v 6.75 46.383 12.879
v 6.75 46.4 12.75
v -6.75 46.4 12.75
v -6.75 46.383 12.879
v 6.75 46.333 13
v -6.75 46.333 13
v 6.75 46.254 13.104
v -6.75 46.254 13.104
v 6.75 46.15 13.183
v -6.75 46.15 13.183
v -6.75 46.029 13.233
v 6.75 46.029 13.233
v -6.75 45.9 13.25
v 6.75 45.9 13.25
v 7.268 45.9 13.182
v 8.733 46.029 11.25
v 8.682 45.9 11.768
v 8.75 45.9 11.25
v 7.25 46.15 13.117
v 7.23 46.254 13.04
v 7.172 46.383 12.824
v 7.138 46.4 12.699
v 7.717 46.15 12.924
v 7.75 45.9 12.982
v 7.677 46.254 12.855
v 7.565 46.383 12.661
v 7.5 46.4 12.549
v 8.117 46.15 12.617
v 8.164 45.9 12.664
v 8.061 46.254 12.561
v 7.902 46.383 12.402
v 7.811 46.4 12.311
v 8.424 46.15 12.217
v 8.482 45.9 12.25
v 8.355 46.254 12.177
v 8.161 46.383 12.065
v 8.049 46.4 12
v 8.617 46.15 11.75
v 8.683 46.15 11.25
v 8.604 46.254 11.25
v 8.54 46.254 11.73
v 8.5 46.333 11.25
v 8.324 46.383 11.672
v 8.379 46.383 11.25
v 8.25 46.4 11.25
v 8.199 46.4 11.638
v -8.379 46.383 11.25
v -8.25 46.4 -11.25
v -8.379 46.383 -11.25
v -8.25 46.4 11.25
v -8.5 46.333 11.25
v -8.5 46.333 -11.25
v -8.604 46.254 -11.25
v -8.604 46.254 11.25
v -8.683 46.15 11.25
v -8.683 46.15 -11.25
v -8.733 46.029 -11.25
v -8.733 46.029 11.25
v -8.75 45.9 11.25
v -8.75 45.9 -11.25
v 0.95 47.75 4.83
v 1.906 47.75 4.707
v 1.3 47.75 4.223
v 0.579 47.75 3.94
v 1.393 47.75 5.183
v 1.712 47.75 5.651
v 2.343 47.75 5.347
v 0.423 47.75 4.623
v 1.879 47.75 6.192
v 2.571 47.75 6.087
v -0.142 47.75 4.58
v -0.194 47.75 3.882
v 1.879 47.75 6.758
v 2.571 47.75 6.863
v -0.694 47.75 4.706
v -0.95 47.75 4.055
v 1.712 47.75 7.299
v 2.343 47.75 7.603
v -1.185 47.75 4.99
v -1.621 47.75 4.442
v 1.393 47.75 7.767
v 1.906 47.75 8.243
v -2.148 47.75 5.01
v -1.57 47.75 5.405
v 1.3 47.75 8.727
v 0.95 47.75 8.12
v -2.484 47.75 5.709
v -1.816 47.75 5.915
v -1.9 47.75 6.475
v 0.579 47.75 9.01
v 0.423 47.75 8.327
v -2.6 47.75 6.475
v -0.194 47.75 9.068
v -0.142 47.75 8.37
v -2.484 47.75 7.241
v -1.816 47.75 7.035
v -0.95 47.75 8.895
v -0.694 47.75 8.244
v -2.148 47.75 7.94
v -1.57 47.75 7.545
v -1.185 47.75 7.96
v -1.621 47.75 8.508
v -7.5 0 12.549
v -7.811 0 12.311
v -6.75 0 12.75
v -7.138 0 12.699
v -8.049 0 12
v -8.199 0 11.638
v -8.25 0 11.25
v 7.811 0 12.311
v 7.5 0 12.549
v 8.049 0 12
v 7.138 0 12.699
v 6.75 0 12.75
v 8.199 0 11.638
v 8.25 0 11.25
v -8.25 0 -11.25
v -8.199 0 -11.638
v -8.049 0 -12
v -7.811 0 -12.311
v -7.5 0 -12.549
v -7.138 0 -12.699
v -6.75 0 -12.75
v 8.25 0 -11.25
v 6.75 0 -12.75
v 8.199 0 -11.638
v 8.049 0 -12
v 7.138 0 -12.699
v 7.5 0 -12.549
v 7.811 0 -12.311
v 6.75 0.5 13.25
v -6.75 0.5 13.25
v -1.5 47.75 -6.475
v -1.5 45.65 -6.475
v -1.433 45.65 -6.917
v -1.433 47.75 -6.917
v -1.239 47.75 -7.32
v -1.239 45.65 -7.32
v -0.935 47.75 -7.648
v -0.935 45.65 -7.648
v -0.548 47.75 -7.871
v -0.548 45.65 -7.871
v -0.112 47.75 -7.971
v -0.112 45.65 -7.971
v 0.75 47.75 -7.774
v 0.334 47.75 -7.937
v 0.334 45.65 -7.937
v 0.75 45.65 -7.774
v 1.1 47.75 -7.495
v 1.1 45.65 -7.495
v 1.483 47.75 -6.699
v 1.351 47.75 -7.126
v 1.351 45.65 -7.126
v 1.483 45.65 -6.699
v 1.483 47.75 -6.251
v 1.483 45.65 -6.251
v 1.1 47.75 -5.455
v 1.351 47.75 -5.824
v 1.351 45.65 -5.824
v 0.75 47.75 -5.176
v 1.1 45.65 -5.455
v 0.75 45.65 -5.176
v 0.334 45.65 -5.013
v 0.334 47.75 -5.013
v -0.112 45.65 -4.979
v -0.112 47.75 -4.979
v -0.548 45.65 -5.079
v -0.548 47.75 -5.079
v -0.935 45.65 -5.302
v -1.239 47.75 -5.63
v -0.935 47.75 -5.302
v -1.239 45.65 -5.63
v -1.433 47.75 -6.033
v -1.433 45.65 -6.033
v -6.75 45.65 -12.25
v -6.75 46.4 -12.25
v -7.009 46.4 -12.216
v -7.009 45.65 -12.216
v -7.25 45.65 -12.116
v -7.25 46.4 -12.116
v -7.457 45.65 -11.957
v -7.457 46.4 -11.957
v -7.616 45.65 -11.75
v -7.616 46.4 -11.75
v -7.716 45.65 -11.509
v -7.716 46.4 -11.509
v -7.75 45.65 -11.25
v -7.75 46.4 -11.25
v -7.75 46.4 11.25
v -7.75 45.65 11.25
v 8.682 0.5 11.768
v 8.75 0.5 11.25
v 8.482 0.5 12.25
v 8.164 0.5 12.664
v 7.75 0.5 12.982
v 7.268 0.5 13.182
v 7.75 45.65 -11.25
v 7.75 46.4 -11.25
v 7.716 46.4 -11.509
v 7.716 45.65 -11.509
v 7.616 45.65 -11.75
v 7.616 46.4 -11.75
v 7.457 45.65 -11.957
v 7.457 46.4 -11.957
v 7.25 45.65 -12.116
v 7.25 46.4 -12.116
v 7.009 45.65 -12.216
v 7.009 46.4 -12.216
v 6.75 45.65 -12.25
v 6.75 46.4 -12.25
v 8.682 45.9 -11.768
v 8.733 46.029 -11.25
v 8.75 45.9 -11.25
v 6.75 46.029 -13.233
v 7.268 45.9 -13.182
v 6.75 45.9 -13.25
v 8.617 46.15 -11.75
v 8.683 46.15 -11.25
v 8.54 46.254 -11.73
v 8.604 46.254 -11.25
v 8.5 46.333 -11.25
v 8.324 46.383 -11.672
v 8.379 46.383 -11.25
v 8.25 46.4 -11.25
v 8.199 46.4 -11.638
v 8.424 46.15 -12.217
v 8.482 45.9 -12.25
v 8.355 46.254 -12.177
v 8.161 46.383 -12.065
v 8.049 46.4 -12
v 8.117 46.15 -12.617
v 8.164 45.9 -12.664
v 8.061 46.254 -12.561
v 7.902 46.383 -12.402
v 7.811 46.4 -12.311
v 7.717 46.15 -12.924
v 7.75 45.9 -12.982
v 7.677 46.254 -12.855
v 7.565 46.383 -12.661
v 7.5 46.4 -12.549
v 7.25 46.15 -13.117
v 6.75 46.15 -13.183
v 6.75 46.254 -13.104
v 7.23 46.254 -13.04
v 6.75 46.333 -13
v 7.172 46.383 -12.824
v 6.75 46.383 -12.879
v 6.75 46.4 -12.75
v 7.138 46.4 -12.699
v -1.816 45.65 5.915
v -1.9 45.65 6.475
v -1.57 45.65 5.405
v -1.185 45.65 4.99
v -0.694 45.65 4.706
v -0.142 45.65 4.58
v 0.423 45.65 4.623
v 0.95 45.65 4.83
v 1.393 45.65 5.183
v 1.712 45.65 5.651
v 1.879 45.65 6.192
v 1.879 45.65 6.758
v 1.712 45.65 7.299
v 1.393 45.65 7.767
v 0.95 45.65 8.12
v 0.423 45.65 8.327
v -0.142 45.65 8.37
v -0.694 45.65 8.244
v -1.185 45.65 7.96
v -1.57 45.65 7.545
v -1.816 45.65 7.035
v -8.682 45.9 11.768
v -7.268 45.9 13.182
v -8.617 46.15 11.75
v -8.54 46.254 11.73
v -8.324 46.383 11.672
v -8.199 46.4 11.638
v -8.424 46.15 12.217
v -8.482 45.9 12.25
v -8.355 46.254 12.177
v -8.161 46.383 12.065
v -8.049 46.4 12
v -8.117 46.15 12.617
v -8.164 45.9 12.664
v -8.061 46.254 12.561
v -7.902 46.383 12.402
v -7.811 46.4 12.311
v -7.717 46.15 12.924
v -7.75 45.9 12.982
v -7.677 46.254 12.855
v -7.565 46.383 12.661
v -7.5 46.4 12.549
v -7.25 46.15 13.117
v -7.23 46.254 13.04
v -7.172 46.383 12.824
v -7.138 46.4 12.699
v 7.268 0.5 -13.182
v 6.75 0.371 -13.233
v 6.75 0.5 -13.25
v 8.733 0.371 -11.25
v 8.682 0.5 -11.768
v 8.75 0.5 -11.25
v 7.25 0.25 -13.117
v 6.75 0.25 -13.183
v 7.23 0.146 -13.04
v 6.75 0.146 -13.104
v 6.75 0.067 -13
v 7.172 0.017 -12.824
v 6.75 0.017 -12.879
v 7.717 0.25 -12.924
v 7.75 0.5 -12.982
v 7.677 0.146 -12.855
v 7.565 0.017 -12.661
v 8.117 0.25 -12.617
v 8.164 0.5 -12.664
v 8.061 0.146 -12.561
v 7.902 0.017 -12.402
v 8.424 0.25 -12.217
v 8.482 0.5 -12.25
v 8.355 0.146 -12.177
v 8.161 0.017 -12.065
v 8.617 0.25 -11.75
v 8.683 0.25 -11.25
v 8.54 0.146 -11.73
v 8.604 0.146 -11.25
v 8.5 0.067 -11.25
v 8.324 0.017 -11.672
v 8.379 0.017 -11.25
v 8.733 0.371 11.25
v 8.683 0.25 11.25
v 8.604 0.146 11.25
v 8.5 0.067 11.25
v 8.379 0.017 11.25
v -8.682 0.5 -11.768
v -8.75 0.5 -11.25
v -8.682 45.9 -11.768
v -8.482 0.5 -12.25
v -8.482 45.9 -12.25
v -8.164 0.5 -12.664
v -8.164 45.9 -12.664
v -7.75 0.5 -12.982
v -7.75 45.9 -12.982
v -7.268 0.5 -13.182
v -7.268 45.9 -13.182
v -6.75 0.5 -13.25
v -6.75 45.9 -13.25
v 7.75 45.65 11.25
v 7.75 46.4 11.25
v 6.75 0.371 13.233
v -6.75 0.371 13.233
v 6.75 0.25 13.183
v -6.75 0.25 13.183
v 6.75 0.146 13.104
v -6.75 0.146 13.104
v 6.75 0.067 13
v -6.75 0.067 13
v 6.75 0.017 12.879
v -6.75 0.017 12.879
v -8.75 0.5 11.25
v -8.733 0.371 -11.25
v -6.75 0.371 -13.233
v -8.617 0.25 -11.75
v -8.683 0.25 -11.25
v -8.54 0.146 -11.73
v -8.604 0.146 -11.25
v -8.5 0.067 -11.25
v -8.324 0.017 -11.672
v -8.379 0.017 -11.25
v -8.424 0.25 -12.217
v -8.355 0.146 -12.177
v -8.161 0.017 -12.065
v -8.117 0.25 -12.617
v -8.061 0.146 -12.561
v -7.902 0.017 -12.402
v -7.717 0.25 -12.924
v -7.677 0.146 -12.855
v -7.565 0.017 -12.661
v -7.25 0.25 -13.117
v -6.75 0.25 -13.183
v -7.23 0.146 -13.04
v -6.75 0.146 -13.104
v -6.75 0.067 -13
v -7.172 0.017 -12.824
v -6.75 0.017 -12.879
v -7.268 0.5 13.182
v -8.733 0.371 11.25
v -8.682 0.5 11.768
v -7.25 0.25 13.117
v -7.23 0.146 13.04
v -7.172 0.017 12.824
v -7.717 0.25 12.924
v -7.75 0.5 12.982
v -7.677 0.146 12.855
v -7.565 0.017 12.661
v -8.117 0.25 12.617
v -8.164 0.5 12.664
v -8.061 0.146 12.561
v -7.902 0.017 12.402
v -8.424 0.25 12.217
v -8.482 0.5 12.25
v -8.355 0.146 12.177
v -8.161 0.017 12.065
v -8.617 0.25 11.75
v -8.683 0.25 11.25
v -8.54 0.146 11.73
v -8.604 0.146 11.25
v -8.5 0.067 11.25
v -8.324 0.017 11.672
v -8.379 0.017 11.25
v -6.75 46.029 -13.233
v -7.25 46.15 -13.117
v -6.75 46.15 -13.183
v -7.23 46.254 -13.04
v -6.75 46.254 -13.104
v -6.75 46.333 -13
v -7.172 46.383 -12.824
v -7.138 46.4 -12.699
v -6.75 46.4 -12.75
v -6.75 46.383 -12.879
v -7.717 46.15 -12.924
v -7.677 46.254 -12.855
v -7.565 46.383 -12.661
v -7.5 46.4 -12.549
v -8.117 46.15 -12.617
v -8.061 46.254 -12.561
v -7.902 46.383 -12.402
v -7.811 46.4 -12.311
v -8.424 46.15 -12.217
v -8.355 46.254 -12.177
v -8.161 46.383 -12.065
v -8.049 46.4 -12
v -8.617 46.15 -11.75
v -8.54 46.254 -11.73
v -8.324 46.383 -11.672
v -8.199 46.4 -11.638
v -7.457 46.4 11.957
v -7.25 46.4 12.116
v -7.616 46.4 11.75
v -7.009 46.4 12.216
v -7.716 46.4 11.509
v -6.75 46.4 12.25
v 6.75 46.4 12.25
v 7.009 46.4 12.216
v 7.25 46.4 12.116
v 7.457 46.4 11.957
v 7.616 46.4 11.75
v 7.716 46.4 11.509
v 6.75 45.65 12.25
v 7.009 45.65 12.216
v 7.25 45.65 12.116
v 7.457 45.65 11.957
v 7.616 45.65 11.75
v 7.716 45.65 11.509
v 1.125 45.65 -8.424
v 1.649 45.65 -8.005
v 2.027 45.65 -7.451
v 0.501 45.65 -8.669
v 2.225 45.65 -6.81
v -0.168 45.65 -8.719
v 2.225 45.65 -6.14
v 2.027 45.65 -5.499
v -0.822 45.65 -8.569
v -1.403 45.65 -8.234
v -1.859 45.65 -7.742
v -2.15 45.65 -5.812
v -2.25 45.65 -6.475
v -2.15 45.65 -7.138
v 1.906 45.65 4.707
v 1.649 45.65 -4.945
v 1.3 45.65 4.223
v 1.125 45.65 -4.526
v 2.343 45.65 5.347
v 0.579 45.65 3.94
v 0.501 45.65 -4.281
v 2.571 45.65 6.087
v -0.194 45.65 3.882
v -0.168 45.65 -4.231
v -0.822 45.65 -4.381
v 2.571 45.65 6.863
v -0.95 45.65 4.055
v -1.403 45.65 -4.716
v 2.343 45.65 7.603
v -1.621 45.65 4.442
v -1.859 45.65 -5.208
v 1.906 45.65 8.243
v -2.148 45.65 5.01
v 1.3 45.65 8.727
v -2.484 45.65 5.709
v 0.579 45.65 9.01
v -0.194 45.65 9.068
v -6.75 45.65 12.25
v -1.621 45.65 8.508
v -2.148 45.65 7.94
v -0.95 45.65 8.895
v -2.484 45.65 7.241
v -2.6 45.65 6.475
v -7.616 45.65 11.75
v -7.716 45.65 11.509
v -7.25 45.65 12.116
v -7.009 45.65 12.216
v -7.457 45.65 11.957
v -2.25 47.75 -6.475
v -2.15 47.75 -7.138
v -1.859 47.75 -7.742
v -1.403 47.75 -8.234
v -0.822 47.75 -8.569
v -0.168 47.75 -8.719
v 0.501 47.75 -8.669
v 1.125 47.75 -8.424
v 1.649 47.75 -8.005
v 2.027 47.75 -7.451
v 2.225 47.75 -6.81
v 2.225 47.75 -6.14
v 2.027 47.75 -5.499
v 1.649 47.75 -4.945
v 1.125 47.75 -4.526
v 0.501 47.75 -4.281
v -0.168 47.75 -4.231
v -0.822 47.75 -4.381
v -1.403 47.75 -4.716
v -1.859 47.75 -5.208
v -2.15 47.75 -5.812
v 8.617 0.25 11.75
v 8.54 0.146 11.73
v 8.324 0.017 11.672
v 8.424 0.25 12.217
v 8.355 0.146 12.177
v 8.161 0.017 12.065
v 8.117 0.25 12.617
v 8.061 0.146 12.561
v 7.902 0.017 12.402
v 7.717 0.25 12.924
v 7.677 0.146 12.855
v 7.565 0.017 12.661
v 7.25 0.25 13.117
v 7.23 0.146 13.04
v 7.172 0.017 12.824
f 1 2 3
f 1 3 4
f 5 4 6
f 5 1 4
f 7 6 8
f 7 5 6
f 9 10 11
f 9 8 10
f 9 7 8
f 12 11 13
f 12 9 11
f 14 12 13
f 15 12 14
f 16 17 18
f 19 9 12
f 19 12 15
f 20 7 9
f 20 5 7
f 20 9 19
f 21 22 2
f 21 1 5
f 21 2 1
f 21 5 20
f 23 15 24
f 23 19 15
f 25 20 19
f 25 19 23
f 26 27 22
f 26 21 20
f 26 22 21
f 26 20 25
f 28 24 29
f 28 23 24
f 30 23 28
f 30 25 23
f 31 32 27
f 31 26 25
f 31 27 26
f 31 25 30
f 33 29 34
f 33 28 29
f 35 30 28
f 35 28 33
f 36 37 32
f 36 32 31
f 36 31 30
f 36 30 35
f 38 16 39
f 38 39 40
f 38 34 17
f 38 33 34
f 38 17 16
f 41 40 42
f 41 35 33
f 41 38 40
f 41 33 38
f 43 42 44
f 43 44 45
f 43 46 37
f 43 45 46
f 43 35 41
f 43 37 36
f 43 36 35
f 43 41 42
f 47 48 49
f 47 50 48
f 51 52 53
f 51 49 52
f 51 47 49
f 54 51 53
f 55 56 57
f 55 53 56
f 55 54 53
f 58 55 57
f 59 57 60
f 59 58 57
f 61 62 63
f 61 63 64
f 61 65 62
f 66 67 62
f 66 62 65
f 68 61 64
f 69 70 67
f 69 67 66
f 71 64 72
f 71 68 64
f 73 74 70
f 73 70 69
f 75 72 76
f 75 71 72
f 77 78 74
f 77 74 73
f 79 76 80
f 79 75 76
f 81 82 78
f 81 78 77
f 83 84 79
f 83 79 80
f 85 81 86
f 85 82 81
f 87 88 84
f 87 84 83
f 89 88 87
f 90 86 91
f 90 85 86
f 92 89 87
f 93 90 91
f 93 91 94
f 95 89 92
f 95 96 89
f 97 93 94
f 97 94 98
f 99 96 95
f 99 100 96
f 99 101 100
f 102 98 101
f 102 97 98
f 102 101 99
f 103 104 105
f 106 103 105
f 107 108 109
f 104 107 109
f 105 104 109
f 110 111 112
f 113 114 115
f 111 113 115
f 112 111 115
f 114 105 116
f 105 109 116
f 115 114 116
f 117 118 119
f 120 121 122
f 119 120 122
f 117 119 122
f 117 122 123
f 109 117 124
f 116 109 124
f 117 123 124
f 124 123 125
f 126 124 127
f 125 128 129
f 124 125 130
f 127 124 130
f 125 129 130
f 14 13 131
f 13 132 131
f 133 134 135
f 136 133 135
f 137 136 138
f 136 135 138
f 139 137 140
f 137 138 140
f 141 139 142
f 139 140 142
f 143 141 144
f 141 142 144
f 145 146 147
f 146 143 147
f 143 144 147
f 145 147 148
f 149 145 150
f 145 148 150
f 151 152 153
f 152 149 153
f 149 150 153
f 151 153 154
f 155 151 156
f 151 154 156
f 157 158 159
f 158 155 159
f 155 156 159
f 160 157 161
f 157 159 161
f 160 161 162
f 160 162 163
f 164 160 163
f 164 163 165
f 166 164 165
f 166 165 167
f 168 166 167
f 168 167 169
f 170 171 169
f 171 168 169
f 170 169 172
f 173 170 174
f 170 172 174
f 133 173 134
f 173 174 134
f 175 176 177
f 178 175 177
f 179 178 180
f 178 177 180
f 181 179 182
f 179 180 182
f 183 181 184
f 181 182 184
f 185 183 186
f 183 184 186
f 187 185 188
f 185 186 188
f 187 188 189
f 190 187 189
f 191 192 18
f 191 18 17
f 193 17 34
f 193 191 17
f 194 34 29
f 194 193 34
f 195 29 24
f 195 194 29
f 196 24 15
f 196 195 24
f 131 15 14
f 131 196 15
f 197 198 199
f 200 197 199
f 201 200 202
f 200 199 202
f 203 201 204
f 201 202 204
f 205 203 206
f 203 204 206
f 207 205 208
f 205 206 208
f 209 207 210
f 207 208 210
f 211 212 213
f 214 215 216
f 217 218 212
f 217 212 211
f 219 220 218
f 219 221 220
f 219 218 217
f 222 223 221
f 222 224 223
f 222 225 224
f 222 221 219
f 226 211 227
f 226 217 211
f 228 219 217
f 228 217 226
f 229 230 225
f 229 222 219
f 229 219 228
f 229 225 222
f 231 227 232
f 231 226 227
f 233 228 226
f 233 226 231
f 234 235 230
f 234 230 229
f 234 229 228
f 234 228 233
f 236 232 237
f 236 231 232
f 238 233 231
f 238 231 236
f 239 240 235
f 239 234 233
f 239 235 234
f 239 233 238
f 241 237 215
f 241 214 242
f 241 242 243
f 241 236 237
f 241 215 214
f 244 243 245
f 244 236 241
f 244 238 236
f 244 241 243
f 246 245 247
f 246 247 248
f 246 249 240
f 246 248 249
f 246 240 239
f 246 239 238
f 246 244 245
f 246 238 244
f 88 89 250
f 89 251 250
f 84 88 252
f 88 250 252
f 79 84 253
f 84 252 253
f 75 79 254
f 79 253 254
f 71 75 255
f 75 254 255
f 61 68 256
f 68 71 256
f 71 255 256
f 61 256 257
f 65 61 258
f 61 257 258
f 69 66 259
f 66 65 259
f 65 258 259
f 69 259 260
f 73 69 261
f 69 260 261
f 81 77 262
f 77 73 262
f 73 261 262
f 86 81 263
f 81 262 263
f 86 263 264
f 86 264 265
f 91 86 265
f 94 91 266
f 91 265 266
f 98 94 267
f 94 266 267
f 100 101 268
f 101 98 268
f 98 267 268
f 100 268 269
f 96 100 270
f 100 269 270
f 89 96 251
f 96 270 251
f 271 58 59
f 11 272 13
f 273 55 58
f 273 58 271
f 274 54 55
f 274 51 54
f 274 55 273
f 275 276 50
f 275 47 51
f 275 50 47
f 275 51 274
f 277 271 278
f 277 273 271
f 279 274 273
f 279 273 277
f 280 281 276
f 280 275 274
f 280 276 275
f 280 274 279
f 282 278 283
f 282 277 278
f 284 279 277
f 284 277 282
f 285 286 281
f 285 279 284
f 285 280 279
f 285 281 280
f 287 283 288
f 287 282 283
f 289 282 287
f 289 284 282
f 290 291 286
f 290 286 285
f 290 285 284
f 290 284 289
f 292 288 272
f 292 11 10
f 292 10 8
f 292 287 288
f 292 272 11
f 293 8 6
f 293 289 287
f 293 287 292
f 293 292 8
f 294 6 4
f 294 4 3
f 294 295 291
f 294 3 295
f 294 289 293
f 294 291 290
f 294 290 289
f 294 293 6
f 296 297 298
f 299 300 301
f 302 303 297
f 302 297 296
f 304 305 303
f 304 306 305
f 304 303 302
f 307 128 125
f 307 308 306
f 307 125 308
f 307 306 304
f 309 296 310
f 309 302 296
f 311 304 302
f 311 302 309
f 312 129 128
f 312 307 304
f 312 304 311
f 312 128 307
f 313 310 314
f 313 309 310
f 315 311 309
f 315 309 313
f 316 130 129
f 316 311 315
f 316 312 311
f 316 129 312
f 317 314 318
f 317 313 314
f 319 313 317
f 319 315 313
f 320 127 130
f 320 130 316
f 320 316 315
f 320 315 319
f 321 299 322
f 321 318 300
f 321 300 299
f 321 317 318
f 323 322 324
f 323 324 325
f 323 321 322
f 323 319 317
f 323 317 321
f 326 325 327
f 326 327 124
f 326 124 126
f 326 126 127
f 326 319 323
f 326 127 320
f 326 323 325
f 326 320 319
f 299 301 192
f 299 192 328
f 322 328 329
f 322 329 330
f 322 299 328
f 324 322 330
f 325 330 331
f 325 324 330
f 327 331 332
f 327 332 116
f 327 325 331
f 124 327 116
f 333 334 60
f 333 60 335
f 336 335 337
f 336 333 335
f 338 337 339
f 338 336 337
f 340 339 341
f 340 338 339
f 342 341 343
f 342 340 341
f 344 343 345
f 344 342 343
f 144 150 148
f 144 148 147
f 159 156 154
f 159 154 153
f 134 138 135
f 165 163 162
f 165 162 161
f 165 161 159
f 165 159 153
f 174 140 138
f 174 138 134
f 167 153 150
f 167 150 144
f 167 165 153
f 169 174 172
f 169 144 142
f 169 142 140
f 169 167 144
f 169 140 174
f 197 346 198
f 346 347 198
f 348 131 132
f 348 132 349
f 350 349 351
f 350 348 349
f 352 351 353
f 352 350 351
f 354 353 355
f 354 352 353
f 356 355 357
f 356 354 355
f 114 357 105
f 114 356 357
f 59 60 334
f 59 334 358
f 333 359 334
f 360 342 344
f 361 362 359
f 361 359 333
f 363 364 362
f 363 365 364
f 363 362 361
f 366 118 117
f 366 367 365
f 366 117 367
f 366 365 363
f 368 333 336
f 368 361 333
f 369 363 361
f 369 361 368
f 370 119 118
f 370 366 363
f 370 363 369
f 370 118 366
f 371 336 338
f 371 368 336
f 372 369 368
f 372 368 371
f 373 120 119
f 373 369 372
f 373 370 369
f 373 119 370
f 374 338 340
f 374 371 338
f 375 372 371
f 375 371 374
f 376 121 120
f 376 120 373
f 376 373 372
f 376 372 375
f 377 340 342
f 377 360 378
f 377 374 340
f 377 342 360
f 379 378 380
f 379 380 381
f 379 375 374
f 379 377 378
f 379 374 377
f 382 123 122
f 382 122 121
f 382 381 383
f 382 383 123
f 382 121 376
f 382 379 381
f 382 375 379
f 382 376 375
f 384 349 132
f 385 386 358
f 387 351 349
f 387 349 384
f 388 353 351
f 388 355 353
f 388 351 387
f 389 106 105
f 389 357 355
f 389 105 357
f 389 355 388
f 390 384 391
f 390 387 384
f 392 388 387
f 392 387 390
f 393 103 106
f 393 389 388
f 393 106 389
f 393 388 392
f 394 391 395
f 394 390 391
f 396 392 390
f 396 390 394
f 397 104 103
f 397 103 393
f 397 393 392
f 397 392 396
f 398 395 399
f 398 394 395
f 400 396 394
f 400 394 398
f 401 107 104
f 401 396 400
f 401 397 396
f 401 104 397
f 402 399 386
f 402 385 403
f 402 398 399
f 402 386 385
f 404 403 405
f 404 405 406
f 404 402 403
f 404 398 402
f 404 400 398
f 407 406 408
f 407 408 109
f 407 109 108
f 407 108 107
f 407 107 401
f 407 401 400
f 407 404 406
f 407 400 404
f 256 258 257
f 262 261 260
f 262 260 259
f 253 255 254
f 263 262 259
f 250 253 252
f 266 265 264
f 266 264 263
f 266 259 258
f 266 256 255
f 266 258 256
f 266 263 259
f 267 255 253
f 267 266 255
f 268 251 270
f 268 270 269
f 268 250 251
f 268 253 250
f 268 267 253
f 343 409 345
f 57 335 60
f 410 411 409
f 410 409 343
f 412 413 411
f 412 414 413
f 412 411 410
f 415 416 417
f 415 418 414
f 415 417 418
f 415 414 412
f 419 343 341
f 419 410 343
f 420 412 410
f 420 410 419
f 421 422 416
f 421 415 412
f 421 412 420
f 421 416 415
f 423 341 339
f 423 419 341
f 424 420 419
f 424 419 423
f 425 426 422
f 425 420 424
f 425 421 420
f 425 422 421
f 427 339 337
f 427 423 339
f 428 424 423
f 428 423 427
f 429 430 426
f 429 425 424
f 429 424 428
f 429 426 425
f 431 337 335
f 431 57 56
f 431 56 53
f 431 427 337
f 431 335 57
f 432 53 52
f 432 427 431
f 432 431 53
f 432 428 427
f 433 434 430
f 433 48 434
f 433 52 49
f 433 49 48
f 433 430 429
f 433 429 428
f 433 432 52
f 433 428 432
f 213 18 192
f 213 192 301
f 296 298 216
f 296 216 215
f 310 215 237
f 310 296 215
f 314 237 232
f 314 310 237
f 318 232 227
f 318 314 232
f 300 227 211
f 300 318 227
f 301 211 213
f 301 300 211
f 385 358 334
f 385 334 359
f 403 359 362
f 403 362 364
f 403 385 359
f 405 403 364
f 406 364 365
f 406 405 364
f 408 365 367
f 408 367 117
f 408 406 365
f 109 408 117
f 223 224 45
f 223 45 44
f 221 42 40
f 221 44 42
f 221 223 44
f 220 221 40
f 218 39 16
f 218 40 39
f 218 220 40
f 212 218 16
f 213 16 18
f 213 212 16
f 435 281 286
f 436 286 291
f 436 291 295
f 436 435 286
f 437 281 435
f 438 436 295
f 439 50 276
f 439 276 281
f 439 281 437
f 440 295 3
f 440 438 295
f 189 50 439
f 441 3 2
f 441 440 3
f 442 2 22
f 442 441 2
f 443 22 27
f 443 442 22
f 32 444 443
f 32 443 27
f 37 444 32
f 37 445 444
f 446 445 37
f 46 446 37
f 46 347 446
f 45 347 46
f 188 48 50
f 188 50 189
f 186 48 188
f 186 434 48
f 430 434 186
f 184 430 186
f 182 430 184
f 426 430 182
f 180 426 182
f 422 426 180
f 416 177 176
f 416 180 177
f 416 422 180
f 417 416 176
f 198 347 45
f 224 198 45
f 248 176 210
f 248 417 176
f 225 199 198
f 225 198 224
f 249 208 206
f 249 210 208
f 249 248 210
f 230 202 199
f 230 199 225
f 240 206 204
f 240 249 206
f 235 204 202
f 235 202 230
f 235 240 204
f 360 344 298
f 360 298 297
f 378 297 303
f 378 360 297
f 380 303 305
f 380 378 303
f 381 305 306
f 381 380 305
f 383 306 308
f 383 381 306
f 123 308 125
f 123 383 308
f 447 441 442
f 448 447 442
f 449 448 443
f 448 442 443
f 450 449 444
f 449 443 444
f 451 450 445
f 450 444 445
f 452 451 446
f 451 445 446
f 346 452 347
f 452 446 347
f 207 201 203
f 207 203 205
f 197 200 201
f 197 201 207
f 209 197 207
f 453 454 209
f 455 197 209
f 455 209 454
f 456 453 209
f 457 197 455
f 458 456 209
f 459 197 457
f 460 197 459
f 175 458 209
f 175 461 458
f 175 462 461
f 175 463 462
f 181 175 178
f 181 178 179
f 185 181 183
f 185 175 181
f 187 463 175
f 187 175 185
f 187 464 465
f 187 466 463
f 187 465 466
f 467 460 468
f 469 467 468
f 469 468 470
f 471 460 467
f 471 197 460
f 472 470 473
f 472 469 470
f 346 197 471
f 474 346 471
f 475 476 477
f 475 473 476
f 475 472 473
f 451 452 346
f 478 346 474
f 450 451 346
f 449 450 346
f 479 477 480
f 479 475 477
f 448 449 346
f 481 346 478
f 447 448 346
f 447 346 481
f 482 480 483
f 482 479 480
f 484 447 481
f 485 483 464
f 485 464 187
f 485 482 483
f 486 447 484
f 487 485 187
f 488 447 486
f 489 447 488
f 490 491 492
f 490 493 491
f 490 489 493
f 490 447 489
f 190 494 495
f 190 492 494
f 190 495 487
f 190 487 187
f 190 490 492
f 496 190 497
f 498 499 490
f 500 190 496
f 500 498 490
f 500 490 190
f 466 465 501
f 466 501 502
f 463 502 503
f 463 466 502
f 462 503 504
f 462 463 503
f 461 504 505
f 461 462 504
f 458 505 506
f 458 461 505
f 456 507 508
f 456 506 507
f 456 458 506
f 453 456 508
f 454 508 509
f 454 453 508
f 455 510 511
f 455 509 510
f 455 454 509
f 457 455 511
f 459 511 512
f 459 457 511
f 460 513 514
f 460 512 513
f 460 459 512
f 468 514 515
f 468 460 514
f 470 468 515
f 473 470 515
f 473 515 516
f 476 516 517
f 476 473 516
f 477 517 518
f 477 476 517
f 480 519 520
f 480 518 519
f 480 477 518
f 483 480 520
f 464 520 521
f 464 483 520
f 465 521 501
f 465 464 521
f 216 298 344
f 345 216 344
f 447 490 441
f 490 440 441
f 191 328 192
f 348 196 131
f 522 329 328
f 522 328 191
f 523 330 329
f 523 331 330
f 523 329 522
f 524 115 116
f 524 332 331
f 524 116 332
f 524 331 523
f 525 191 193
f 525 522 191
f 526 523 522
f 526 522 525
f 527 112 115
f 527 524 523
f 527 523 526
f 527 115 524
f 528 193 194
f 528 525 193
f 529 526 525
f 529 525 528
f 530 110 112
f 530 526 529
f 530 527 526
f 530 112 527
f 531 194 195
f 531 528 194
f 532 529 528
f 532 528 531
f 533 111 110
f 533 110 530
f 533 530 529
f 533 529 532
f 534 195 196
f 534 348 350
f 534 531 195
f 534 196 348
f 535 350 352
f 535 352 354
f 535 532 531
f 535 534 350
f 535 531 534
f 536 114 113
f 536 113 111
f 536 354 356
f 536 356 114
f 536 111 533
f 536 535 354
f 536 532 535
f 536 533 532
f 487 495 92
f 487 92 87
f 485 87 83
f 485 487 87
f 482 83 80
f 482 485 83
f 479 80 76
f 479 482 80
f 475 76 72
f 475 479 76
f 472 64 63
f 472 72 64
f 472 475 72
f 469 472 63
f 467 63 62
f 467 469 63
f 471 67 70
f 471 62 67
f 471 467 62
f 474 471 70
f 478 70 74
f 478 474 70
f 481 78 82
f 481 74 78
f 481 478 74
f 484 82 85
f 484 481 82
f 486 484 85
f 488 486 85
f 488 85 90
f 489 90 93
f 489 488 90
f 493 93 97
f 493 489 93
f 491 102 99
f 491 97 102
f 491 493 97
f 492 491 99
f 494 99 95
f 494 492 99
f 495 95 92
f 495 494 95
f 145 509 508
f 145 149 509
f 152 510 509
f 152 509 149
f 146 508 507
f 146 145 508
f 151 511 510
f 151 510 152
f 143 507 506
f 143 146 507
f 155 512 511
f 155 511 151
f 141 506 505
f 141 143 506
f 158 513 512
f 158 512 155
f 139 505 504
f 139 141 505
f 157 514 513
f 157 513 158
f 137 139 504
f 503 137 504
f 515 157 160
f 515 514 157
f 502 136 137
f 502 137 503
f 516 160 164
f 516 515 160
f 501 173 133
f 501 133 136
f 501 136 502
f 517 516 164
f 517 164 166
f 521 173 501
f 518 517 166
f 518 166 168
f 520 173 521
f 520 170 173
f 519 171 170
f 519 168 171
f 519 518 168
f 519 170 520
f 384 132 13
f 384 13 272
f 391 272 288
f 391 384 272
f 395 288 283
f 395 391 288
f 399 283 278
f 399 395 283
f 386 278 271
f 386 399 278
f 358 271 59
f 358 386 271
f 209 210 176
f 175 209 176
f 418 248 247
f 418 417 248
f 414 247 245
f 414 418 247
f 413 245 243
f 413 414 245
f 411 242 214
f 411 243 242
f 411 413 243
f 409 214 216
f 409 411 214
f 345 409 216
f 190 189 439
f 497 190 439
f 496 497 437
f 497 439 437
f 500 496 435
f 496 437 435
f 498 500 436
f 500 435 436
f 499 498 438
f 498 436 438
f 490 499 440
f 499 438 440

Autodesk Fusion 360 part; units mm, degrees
sketch "Sketch1" plane through (0, 0, 0) normal (0, 1, 0) x (1, 0, 0)
  line L0 (6.75, 13.25) -> (-6.75, 13.25)
  line L1 (-8.75, 11.25) -> (-8.75, -11.25)
  line L2 (-6.75, -13.25) -> (6.75, -13.25)
  line L3 (8.75, -11.25) -> (8.75, 11.25)
  arc A0 (-6.75, 13.25) -> (-8.75, 11.25) centre (-6.75, 11.25) ccw
  arc A1 (8.75, 11.25) -> (6.75, 13.25) centre (6.75, 11.25) ccw
  arc A2 (6.75, -13.25) -> (8.75, -11.25) centre (6.75, -11.25) ccw
  arc A3 (-8.75, -11.25) -> (-6.75, -13.25) centre (-6.75, -11.25) ccw
  point P0 (8.75, 13.25)
  point P1 (-8.75, 13.25)
  point P2 (8.75, -13.25)
  dimension "d1" = 17.5
  dimension "d2" = 26.5
  dimension "d3" = 2
extrude "Extrude1" add sketch "Sketch1" along normal blind 46.4
sketch "Sketch2" plane through (0, 46.4, 0) normal (0, 1, 0) x (-1, 0, 0)
  arc A0 (8.75, 11.25) -> (6.75, 13.25) centre (6.75, 11.25) ccw
  line L0 (6.75, 13.25) -> (-6.75, 13.25)
  arc A1 (-6.75, 13.25) -> (-8.75, 11.25) centre (-6.75, 11.25) ccw
  line L1 (-8.75, 11.25) -> (-8.75, -11.25)
  arc A2 (-8.75, -11.25) -> (-6.75, -13.25) centre (-6.75, -11.25) ccw
  line L2 (-6.75, -13.25) -> (6.75, -13.25)
  arc A3 (6.75, -13.25) -> (8.75, -11.25) centre (6.75, -11.25) ccw
  line L3 (8.75, -11.25) -> (8.75, 11.25)
  line L4 (7.75, -11.25) -> (7.75, 11.25)
  arc A4 (7.75, 11.25) -> (6.75, 12.25) centre (6.75, 11.25) ccw
  line L5 (6.75, 12.25) -> (-6.75, 12.25)
  arc A5 (-6.75, 12.25) -> (-7.75, 11.25) centre (-6.75, 11.25) ccw
  line L6 (-7.75, 11.25) -> (-7.75, -11.25)
  arc A6 (-7.75, -11.25) -> (-6.75, -12.25) centre (-6.75, -11.25) ccw
  line L7 (-6.75, -12.25) -> (6.75, -12.25)
  arc A7 (6.75, -12.25) -> (7.75, -11.25) centre (6.75, -11.25) ccw
  dimension "d6" = -1
extrude "Extrude2" cut sketch "Sketch2" against normal blind 0.75 contours L4 A4 L5 A5 L6 A6 L7 A7
fillet "Fillet1" radius 0.5 16 edges at (0, 46.4, -13.25) (-8.1642, 46.4, -12.6642) (-8.75, 46.4, 0) (-8.1642, 46.4, 12.6642) (0, 46.4, 13.25) (8.1642, 46.4, 12.6642) (8.75, 46.4, 0) (8.1642, 46.4, -12.6642) (0, 0, -13.25) (-8.1642, 0, -12.6642) (-8.75, 0, 0) (-8.1642, 0, 12.6642) (0, 0, 13.25) (8.1642, 0, 12.6642) (8.75, 0, 0) (8.1642, 0, -12.6642)
sketch "Sketch3" plane through (0, 45.65, 0) normal (0, 1, 0) x (-1, 0, 0)
  arc A0 (6.75, -12.25) -> (7.75, -11.25) centre (6.75, -11.25) ccw
  line L0 (7.75, -11.25) -> (7.75, 11.25)
  arc A1 (7.75, 11.25) -> (6.75, 12.25) centre (6.75, 11.25) ccw
  line L1 (6.75, 12.25) -> (-6.75, 12.25)
  arc A2 (-6.75, 12.25) -> (-7.75, 11.25) centre (-6.75, 11.25) ccw
  line L2 (-7.75, 11.25) -> (-7.75, -11.25)
  arc A3 (-7.75, -11.25) -> (-6.75, -12.25) centre (-6.75, -11.25) ccw
  line L3 (-6.75, -12.25) -> (6.75, -12.25)
  circle A4 centre (0, -6.475) radius 2.25
  circle A5 centre (0, 6.475) radius 2.6
  circle A6 centre (0, -6.475) radius 1.5
  circle A7 centre (0, 6.475) radius 1.9
  dimension "d11" = 6.475
  dimension "d12" = 6.475
  dimension "d13" = 4.5
  dimension "d14" = 5.2
  dimension "d15" = -0.75
  dimension "d16" = -0.7
extrude "Extrude3" add sketch "Sketch3" along normal blind 2.1 contours A4 | A5
equation "d11 = ( 12.95 / 2 ) * 1 mm"
equation "d12 = ( 12.95 / 2 ) * 1 mm"
